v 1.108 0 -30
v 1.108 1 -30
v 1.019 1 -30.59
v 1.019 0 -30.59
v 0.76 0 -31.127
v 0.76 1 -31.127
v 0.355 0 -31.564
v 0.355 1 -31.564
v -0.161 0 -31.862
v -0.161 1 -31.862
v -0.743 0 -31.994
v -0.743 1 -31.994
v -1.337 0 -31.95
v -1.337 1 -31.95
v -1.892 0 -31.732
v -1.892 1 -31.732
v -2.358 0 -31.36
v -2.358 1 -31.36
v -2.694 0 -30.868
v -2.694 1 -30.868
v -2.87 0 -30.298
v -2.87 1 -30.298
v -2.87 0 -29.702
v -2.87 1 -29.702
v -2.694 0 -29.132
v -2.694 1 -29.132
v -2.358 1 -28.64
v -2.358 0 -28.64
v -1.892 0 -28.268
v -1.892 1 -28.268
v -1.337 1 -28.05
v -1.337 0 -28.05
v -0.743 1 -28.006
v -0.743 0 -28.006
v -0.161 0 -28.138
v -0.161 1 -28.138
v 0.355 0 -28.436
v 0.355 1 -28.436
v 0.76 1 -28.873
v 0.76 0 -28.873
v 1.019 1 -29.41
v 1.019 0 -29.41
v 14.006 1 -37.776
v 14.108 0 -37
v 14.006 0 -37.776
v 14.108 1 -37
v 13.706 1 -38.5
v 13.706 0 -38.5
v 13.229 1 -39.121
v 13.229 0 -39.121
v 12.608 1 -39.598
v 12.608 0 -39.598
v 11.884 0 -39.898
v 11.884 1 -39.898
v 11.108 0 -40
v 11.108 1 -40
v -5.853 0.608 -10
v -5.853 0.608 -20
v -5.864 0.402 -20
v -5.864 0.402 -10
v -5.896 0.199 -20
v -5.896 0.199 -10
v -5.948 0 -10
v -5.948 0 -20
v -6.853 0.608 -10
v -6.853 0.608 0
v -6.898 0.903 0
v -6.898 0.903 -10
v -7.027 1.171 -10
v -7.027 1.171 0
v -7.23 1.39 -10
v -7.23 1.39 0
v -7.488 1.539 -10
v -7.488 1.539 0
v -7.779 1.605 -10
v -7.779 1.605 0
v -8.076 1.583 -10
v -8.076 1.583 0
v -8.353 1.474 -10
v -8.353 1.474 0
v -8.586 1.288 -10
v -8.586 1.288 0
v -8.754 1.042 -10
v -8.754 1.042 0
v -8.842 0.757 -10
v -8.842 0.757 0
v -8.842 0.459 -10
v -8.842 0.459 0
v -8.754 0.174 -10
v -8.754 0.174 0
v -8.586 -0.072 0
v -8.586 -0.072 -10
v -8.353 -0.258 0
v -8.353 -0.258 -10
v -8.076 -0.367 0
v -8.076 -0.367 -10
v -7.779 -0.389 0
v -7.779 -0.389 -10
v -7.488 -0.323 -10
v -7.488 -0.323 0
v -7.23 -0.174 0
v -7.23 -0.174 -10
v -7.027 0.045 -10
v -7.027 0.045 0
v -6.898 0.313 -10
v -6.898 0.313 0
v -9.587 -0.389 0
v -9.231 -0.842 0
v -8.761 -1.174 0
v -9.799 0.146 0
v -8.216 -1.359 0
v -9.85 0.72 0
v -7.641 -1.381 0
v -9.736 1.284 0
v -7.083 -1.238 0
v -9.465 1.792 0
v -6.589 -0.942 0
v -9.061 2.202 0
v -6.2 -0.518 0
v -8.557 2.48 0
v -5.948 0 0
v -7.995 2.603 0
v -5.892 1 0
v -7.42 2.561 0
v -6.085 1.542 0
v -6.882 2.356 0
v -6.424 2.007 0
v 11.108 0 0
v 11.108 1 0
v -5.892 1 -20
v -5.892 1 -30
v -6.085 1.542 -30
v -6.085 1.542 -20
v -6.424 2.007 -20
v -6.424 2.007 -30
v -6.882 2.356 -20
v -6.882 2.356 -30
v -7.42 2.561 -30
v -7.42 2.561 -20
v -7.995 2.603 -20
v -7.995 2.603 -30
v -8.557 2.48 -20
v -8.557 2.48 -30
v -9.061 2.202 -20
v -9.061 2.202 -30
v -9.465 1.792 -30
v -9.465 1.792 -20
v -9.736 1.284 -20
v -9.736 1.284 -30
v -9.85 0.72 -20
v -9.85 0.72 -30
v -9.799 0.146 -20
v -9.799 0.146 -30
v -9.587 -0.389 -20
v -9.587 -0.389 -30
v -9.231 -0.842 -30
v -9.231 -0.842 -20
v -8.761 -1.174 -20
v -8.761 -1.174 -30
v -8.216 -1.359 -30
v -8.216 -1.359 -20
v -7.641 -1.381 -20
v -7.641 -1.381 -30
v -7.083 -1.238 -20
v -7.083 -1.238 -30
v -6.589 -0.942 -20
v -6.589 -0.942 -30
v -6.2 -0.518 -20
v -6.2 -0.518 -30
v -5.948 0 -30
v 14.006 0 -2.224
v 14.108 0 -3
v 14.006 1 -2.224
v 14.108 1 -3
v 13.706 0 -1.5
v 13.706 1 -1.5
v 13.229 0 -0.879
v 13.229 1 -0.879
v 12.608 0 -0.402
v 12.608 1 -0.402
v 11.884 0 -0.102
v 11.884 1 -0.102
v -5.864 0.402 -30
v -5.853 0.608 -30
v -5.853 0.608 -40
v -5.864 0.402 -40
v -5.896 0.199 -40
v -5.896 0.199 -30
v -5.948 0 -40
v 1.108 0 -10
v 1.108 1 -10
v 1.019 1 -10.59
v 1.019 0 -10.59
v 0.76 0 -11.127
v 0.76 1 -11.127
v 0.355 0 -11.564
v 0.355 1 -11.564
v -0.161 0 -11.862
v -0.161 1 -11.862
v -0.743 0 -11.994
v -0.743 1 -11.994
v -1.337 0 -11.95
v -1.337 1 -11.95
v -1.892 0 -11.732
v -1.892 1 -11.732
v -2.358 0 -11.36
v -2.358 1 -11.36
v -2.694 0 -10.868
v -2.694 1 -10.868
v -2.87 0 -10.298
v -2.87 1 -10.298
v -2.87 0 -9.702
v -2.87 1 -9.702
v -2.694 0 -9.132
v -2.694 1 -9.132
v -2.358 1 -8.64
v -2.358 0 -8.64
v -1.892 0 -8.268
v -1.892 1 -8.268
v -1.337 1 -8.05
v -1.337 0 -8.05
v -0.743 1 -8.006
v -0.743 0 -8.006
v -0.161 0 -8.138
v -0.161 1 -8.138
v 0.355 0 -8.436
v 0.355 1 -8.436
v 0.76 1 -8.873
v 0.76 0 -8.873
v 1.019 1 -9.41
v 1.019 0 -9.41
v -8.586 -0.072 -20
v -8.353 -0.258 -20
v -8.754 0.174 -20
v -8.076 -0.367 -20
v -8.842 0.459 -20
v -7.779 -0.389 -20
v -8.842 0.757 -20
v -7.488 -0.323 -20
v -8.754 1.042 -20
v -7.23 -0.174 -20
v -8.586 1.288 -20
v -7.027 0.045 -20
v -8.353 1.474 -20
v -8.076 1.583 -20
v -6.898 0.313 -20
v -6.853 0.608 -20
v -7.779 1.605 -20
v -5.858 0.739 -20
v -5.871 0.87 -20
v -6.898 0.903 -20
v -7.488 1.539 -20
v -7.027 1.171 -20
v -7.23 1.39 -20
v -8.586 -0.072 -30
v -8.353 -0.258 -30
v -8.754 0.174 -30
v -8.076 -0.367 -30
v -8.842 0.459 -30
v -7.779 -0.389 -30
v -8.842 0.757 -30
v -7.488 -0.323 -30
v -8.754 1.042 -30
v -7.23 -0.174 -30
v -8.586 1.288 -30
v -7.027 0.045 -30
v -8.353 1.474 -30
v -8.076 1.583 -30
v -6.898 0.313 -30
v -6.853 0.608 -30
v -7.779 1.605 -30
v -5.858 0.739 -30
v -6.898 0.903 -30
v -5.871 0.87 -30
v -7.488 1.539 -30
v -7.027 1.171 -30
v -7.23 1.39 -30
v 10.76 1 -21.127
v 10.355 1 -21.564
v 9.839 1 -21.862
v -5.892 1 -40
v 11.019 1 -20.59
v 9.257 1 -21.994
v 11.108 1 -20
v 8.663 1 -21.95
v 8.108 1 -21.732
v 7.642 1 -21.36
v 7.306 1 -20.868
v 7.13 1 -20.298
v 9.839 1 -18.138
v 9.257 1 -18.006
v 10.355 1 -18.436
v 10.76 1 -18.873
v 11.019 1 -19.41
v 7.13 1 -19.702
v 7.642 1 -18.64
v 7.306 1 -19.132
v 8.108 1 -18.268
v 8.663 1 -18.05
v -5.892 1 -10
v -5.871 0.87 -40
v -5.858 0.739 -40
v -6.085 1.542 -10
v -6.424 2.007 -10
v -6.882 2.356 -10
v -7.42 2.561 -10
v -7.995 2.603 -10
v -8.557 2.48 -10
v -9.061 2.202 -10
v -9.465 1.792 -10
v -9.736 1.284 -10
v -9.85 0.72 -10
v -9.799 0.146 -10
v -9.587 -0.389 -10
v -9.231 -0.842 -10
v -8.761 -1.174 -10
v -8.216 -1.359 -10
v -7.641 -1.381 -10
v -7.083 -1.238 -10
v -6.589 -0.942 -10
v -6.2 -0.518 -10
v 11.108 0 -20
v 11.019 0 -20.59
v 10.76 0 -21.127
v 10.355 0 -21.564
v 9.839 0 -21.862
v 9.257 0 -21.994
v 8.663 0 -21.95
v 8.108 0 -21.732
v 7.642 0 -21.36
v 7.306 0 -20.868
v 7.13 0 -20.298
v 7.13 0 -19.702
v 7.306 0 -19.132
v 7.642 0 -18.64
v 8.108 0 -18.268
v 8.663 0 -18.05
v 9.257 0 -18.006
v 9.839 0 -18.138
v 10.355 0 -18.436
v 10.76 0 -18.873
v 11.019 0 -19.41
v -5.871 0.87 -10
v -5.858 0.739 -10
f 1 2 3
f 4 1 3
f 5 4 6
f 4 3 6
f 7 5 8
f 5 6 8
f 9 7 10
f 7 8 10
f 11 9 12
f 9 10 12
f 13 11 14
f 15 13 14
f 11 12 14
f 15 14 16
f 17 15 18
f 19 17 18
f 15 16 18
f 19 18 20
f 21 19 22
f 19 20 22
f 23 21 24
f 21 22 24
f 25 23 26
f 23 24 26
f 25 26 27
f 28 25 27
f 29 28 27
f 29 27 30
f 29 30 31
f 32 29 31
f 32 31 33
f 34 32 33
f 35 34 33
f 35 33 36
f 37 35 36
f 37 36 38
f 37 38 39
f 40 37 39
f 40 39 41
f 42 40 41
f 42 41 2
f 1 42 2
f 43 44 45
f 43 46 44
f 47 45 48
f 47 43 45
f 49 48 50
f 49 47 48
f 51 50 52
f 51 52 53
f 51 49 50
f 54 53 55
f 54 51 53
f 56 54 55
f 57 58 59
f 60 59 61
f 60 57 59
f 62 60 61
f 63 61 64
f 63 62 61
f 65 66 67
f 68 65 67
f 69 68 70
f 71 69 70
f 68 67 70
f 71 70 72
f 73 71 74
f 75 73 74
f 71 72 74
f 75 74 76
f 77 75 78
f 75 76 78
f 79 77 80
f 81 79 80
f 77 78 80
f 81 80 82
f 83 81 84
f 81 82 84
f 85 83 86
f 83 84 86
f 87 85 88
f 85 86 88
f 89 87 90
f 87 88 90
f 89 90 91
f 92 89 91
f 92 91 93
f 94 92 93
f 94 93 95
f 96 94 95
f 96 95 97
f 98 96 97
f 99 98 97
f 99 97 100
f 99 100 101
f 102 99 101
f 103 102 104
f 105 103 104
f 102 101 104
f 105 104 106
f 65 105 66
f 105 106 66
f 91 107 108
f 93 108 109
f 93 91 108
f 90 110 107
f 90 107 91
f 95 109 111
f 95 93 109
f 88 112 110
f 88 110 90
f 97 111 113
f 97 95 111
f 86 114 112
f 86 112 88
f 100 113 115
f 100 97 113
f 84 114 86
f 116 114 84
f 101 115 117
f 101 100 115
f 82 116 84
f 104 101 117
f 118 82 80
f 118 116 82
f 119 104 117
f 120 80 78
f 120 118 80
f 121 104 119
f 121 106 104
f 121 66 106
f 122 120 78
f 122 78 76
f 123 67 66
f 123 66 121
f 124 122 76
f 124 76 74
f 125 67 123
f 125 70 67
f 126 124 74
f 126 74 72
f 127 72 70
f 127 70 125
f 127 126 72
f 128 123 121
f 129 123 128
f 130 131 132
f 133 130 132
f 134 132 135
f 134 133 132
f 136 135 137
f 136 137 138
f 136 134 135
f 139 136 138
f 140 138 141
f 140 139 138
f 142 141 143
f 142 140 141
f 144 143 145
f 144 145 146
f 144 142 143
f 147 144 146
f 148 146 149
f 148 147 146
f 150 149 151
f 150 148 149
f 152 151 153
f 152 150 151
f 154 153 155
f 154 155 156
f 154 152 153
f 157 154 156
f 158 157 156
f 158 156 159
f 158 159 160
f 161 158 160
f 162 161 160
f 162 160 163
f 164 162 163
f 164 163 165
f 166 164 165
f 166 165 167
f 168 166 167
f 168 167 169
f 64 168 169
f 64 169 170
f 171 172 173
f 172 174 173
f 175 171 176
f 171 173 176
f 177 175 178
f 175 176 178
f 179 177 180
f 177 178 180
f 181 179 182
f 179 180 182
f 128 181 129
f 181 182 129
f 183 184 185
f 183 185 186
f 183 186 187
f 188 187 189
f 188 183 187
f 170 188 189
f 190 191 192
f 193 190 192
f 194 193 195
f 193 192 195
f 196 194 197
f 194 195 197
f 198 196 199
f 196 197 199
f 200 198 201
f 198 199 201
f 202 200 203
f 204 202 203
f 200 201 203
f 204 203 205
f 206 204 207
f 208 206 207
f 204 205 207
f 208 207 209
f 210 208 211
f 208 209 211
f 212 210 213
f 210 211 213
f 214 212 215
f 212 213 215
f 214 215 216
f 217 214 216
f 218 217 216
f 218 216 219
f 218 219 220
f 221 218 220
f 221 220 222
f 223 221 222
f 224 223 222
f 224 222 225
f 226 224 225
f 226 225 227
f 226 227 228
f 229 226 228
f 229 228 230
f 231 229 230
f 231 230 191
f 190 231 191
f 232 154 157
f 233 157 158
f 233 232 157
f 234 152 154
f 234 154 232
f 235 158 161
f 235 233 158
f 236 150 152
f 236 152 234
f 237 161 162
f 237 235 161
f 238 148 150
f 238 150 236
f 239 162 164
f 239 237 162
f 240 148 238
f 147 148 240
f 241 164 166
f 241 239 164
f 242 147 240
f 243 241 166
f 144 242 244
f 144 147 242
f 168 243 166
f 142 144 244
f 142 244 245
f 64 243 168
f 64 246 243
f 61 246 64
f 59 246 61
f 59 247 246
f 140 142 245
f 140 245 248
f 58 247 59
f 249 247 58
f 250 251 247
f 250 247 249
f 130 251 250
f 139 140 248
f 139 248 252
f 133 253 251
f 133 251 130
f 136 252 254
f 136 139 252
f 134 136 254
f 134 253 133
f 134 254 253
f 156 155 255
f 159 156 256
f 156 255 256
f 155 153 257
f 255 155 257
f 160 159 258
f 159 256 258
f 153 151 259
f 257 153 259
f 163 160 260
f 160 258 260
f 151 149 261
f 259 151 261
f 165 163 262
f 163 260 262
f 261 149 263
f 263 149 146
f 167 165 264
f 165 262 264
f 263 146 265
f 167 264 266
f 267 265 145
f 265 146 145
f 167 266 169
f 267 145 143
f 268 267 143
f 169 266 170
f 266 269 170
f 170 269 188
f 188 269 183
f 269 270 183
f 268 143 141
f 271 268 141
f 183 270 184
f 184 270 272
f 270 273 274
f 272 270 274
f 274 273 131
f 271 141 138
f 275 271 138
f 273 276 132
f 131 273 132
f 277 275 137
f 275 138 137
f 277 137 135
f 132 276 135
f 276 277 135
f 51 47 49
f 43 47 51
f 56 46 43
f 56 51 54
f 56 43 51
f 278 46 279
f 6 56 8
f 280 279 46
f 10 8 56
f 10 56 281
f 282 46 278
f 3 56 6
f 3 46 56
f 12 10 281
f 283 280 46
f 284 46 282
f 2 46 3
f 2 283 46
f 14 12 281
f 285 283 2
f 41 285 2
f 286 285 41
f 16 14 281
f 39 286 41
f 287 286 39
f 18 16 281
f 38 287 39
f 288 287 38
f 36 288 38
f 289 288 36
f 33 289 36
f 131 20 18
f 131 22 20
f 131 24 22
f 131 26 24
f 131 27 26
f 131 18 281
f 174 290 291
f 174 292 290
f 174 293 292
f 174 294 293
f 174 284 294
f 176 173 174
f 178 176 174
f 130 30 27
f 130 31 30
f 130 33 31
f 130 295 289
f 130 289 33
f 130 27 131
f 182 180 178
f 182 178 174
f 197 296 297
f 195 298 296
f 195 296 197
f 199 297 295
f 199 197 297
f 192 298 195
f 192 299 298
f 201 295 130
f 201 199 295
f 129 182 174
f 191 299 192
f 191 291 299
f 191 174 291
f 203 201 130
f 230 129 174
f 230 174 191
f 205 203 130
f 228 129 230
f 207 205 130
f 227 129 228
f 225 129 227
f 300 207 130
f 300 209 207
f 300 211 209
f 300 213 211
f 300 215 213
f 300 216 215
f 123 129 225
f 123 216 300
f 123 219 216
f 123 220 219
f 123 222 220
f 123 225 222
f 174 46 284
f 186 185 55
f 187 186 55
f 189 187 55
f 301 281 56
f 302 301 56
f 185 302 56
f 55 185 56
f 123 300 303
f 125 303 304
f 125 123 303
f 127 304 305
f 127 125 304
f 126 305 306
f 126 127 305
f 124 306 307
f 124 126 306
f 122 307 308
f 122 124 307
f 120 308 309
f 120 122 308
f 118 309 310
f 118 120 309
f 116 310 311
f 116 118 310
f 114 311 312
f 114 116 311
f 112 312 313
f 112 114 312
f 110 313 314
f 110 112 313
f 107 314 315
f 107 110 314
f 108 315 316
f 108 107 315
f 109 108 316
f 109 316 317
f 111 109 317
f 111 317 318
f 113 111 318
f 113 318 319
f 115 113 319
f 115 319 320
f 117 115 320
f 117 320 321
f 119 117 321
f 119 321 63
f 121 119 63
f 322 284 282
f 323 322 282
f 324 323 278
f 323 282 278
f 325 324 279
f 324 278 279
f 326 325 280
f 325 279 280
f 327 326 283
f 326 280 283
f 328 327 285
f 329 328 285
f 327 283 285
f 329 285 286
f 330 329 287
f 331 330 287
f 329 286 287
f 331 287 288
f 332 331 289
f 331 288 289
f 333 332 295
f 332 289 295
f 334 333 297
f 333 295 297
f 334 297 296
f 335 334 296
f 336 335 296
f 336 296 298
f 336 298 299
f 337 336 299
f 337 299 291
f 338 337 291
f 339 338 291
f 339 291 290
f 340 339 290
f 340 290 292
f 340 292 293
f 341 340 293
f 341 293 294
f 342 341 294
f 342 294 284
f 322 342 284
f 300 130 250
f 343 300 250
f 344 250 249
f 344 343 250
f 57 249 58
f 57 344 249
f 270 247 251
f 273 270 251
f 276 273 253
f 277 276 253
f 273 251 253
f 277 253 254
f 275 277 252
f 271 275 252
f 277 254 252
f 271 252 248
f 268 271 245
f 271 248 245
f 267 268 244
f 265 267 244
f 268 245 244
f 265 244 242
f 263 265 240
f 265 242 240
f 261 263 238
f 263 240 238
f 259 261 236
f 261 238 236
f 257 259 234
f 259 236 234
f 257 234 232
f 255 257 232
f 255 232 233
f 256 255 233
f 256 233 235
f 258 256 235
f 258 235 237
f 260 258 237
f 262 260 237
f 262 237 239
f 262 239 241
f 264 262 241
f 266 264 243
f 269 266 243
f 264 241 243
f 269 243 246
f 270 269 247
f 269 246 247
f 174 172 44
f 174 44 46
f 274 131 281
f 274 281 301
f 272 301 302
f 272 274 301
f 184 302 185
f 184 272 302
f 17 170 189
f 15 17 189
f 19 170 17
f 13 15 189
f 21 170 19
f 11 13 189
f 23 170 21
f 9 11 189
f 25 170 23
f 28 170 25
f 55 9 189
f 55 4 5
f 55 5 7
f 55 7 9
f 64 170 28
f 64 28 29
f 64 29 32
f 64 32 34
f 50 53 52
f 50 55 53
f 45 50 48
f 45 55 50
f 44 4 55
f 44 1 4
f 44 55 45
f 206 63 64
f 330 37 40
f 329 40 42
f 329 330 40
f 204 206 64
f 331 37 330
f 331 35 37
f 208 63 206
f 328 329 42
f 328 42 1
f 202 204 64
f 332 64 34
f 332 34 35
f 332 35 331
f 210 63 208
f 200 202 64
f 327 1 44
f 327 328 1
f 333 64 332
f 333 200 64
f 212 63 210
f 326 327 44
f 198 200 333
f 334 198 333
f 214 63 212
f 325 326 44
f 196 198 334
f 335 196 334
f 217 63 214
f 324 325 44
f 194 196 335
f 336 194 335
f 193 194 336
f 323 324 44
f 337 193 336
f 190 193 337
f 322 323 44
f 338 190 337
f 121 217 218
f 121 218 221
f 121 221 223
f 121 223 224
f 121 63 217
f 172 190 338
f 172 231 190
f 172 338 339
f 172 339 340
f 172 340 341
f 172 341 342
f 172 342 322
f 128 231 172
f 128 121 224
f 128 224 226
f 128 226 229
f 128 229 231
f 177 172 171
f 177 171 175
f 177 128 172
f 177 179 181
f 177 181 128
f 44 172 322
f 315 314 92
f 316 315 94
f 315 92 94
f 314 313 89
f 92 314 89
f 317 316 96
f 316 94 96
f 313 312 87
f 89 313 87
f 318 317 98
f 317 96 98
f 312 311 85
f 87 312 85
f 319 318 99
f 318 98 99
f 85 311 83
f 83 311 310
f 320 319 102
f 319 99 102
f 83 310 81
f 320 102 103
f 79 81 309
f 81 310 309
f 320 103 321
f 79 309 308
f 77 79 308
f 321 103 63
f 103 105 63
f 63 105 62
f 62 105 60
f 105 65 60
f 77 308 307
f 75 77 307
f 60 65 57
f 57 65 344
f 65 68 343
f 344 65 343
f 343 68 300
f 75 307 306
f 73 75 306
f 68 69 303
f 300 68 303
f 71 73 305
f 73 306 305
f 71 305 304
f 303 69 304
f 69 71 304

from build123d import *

# Parameters (mm, degrees)
BOSS_EXTRUDE2_DEPTH = 40
SKETCH3_4_R         = 1
BOSS_EXTRUDE3_DEPTH = 10
BOSS_EXTRUDE4_START = -20
SKETCH3_5_R         = 1
BOSS_EXTRUDE4_DEPTH = 10
SKETCH5_R           = 2
CUT_EXTRUDE1_DEPTH  = 10
FILLET1_R           = 3
FILLET2_R           = 3


with BuildPart() as part:
    # Sketch3 → Boss-Extrude2 (new body)
    with BuildSketch(Plane.XY):
        with BuildLine():
            Line((14.107916892, 0), (14.107916892, 1))
            Line((14.107916892, 1), (-5.892083108, 1))
            ThreePointArc((-5.892083108, 1), (-5.863018057, 0.804975408), (-5.853298215, 0.608036602))
            ThreePointArc((-5.853298215, 0.608036602), (-5.877106832, 0.300355571), (-5.947965831, 0))
            Line((-5.947965831, 0), (14.107916892, 0))
        make_face()
    extrude(amount=-BOSS_EXTRUDE2_DEPTH)

    # Sketch3<4> → Boss-Extrude3 (add)
    with BuildSketch(Plane.XY):
        with BuildLine():
            ThreePointArc((-5.853298215, 0.608036602), (-5.863018057, 0.804975408), (-5.892083108, 1))
            ThreePointArc((-5.892083108, 1), (-9.850182631, 0.719627941), (-5.947965831, 0))
            ThreePointArc((-5.947965831, 0), (-5.877106832, 0.300355571), (-5.853298215, 0.608036602))
        make_face()
        with Locations((-7.853298215, 0.608036602)):
            Circle(SKETCH3_4_R, mode=Mode.SUBTRACT)
    extrude(amount=-BOSS_EXTRUDE3_DEPTH)

    # Sketch3<5> → Boss-Extrude4 (add)
    with BuildSketch(Plane.XY.offset(BOSS_EXTRUDE4_START)):
        with BuildLine():
            ThreePointArc((-5.853298215, 0.608036602), (-5.863018057, 0.804975408), (-5.892083108, 1))
            ThreePointArc((-5.892083108, 1), (-9.850182631, 0.719627941), (-5.947965831, 0))
            ThreePointArc((-5.947965831, 0), (-5.877106832, 0.300355571), (-5.853298215, 0.608036602))
        make_face()
        with Locations((-7.853298215, 0.608036602)):
            Circle(SKETCH3_5_R, mode=Mode.SUBTRACT)
    extrude(amount=-BOSS_EXTRUDE4_DEPTH)

    # Sketch5 → Cut-Extrude1 (cut)
    with BuildSketch(Plane(origin=(0, 1, 0), x_dir=(1, 0, 0), z_dir=(0, 1, 0))):
        with Locations((-0.892083108, 30)):
            Circle(SKETCH5_R)
        with Locations((-0.892083108, 10)):
            Circle(SKETCH5_R)
        with Locations((9.107916892, 20)):
            Circle(SKETCH5_R)
    extrude(amount=-CUT_EXTRUDE1_DEPTH, mode=Mode.SUBTRACT)

    # Fillet1
    fillet1_edges = [part.edges().sort_by_distance(p)[0] for p in [
        (14.107916892, 0.5, -40),
    ]]
    fillet(fillet1_edges, radius=FILLET1_R)

    # Fillet2
    fillet2_edges = [part.edges().sort_by_distance(p)[0] for p in [
        (14.107916892, 0.5, 0),
    ]]
    fillet(fillet2_edges, radius=FILLET2_R)


solid = part.part
